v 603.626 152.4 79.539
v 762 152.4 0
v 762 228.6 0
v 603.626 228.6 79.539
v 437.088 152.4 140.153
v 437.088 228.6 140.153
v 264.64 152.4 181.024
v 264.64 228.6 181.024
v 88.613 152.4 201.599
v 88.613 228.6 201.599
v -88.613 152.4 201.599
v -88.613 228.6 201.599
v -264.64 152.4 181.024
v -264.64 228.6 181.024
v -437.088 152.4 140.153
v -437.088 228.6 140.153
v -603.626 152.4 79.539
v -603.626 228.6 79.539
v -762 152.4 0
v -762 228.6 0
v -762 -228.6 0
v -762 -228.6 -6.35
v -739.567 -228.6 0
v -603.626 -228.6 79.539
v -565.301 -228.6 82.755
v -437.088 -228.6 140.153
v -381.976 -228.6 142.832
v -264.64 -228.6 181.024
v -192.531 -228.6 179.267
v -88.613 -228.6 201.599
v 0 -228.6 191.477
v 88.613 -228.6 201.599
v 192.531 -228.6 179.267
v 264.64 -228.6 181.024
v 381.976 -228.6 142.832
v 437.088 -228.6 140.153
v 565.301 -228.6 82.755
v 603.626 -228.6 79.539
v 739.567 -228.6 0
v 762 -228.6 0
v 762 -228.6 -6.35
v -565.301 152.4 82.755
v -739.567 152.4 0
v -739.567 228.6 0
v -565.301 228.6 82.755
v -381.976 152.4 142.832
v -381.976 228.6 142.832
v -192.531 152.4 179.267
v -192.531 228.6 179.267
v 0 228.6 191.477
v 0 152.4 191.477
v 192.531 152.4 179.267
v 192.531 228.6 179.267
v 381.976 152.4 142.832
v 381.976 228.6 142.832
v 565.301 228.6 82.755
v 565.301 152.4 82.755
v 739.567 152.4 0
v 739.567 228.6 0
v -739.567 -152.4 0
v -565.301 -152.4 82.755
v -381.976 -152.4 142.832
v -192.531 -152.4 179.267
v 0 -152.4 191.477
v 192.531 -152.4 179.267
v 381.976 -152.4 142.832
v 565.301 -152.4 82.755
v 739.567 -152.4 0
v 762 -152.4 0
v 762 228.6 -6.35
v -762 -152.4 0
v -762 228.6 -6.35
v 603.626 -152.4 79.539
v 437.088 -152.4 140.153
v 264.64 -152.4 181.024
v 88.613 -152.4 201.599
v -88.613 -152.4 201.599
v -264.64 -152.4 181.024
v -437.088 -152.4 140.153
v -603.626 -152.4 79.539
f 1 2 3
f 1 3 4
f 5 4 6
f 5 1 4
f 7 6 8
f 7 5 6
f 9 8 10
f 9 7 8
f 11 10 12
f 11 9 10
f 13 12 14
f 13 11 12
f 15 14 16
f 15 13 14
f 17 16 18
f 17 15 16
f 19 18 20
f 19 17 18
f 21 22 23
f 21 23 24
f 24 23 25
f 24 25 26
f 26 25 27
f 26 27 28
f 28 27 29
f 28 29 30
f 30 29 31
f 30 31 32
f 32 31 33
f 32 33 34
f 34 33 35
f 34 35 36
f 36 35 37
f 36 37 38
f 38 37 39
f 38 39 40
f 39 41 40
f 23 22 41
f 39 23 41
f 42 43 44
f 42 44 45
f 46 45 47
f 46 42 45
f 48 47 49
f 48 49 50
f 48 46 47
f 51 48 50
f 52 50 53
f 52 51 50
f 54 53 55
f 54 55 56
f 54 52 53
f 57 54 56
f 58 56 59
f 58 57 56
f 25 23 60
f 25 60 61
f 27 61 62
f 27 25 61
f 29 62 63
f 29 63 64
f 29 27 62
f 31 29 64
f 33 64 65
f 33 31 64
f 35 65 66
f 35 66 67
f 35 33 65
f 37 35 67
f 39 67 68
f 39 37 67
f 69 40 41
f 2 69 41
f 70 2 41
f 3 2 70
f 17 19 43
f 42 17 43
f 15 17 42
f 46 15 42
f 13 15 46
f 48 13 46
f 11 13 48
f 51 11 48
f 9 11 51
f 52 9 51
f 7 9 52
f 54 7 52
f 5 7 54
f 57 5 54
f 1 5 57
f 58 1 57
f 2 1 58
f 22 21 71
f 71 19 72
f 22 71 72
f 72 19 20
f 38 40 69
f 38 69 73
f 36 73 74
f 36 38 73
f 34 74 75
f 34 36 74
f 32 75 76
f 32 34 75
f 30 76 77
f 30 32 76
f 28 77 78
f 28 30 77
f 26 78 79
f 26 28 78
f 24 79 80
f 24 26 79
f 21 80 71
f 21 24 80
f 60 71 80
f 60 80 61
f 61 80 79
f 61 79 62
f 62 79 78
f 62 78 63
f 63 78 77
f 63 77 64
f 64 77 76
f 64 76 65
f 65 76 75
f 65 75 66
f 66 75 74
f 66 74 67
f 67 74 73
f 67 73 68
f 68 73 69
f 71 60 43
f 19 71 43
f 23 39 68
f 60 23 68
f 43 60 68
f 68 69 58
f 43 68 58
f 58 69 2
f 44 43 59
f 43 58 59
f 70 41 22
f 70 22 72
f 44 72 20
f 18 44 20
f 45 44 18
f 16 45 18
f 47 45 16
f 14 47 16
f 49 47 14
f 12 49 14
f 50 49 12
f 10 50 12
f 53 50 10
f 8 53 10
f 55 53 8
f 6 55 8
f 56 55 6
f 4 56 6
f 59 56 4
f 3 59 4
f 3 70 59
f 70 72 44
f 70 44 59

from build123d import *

# Parameters (mm, degrees)
F1_DEPTH = 228.6
F2_DEPTH = 152.4
F3_W     = 457.2
F3_H     = 6.35
F4_DEPTH = 762


with BuildPart() as f1:
    # F0 (on Front) → F1 (new body, symmetric)
    with BuildSketch(Plane.XZ):
        with BuildLine():
            Line((739.566909, 0), (762, 0))
            ThreePointArc((762, 0), (0, 204.177285), (-762, 0))
            Line((-762, 0), (-739.566909, 0))
            ThreePointArc((-739.566909, 0), (0, 191.477285), (739.566909, 0))
        make_face()
    extrude(amount=F1_DEPTH, both=True)

    # F0 (on Front) → F2 (cut, symmetric)
    with BuildSketch(Plane.XZ):
        with BuildLine():
            Line((739.566909, 0), (762, 0))
            ThreePointArc((762, 0), (0, 204.177285), (-762, 0))
            Line((-762, 0), (-739.566909, 0))
            ThreePointArc((-739.566909, 0), (0, 191.477285), (739.566909, 0))
        make_face()
    extrude(amount=F2_DEPTH, both=True, mode=Mode.SUBTRACT)

    # F3 (on Right) → F4 (join, symmetric)
    with BuildSketch(Plane.YZ):
        with Locations((0, -3.175)):
            Rectangle(F3_W, F3_H)
    extrude(amount=F4_DEPTH, both=True)


solid = f1.part
